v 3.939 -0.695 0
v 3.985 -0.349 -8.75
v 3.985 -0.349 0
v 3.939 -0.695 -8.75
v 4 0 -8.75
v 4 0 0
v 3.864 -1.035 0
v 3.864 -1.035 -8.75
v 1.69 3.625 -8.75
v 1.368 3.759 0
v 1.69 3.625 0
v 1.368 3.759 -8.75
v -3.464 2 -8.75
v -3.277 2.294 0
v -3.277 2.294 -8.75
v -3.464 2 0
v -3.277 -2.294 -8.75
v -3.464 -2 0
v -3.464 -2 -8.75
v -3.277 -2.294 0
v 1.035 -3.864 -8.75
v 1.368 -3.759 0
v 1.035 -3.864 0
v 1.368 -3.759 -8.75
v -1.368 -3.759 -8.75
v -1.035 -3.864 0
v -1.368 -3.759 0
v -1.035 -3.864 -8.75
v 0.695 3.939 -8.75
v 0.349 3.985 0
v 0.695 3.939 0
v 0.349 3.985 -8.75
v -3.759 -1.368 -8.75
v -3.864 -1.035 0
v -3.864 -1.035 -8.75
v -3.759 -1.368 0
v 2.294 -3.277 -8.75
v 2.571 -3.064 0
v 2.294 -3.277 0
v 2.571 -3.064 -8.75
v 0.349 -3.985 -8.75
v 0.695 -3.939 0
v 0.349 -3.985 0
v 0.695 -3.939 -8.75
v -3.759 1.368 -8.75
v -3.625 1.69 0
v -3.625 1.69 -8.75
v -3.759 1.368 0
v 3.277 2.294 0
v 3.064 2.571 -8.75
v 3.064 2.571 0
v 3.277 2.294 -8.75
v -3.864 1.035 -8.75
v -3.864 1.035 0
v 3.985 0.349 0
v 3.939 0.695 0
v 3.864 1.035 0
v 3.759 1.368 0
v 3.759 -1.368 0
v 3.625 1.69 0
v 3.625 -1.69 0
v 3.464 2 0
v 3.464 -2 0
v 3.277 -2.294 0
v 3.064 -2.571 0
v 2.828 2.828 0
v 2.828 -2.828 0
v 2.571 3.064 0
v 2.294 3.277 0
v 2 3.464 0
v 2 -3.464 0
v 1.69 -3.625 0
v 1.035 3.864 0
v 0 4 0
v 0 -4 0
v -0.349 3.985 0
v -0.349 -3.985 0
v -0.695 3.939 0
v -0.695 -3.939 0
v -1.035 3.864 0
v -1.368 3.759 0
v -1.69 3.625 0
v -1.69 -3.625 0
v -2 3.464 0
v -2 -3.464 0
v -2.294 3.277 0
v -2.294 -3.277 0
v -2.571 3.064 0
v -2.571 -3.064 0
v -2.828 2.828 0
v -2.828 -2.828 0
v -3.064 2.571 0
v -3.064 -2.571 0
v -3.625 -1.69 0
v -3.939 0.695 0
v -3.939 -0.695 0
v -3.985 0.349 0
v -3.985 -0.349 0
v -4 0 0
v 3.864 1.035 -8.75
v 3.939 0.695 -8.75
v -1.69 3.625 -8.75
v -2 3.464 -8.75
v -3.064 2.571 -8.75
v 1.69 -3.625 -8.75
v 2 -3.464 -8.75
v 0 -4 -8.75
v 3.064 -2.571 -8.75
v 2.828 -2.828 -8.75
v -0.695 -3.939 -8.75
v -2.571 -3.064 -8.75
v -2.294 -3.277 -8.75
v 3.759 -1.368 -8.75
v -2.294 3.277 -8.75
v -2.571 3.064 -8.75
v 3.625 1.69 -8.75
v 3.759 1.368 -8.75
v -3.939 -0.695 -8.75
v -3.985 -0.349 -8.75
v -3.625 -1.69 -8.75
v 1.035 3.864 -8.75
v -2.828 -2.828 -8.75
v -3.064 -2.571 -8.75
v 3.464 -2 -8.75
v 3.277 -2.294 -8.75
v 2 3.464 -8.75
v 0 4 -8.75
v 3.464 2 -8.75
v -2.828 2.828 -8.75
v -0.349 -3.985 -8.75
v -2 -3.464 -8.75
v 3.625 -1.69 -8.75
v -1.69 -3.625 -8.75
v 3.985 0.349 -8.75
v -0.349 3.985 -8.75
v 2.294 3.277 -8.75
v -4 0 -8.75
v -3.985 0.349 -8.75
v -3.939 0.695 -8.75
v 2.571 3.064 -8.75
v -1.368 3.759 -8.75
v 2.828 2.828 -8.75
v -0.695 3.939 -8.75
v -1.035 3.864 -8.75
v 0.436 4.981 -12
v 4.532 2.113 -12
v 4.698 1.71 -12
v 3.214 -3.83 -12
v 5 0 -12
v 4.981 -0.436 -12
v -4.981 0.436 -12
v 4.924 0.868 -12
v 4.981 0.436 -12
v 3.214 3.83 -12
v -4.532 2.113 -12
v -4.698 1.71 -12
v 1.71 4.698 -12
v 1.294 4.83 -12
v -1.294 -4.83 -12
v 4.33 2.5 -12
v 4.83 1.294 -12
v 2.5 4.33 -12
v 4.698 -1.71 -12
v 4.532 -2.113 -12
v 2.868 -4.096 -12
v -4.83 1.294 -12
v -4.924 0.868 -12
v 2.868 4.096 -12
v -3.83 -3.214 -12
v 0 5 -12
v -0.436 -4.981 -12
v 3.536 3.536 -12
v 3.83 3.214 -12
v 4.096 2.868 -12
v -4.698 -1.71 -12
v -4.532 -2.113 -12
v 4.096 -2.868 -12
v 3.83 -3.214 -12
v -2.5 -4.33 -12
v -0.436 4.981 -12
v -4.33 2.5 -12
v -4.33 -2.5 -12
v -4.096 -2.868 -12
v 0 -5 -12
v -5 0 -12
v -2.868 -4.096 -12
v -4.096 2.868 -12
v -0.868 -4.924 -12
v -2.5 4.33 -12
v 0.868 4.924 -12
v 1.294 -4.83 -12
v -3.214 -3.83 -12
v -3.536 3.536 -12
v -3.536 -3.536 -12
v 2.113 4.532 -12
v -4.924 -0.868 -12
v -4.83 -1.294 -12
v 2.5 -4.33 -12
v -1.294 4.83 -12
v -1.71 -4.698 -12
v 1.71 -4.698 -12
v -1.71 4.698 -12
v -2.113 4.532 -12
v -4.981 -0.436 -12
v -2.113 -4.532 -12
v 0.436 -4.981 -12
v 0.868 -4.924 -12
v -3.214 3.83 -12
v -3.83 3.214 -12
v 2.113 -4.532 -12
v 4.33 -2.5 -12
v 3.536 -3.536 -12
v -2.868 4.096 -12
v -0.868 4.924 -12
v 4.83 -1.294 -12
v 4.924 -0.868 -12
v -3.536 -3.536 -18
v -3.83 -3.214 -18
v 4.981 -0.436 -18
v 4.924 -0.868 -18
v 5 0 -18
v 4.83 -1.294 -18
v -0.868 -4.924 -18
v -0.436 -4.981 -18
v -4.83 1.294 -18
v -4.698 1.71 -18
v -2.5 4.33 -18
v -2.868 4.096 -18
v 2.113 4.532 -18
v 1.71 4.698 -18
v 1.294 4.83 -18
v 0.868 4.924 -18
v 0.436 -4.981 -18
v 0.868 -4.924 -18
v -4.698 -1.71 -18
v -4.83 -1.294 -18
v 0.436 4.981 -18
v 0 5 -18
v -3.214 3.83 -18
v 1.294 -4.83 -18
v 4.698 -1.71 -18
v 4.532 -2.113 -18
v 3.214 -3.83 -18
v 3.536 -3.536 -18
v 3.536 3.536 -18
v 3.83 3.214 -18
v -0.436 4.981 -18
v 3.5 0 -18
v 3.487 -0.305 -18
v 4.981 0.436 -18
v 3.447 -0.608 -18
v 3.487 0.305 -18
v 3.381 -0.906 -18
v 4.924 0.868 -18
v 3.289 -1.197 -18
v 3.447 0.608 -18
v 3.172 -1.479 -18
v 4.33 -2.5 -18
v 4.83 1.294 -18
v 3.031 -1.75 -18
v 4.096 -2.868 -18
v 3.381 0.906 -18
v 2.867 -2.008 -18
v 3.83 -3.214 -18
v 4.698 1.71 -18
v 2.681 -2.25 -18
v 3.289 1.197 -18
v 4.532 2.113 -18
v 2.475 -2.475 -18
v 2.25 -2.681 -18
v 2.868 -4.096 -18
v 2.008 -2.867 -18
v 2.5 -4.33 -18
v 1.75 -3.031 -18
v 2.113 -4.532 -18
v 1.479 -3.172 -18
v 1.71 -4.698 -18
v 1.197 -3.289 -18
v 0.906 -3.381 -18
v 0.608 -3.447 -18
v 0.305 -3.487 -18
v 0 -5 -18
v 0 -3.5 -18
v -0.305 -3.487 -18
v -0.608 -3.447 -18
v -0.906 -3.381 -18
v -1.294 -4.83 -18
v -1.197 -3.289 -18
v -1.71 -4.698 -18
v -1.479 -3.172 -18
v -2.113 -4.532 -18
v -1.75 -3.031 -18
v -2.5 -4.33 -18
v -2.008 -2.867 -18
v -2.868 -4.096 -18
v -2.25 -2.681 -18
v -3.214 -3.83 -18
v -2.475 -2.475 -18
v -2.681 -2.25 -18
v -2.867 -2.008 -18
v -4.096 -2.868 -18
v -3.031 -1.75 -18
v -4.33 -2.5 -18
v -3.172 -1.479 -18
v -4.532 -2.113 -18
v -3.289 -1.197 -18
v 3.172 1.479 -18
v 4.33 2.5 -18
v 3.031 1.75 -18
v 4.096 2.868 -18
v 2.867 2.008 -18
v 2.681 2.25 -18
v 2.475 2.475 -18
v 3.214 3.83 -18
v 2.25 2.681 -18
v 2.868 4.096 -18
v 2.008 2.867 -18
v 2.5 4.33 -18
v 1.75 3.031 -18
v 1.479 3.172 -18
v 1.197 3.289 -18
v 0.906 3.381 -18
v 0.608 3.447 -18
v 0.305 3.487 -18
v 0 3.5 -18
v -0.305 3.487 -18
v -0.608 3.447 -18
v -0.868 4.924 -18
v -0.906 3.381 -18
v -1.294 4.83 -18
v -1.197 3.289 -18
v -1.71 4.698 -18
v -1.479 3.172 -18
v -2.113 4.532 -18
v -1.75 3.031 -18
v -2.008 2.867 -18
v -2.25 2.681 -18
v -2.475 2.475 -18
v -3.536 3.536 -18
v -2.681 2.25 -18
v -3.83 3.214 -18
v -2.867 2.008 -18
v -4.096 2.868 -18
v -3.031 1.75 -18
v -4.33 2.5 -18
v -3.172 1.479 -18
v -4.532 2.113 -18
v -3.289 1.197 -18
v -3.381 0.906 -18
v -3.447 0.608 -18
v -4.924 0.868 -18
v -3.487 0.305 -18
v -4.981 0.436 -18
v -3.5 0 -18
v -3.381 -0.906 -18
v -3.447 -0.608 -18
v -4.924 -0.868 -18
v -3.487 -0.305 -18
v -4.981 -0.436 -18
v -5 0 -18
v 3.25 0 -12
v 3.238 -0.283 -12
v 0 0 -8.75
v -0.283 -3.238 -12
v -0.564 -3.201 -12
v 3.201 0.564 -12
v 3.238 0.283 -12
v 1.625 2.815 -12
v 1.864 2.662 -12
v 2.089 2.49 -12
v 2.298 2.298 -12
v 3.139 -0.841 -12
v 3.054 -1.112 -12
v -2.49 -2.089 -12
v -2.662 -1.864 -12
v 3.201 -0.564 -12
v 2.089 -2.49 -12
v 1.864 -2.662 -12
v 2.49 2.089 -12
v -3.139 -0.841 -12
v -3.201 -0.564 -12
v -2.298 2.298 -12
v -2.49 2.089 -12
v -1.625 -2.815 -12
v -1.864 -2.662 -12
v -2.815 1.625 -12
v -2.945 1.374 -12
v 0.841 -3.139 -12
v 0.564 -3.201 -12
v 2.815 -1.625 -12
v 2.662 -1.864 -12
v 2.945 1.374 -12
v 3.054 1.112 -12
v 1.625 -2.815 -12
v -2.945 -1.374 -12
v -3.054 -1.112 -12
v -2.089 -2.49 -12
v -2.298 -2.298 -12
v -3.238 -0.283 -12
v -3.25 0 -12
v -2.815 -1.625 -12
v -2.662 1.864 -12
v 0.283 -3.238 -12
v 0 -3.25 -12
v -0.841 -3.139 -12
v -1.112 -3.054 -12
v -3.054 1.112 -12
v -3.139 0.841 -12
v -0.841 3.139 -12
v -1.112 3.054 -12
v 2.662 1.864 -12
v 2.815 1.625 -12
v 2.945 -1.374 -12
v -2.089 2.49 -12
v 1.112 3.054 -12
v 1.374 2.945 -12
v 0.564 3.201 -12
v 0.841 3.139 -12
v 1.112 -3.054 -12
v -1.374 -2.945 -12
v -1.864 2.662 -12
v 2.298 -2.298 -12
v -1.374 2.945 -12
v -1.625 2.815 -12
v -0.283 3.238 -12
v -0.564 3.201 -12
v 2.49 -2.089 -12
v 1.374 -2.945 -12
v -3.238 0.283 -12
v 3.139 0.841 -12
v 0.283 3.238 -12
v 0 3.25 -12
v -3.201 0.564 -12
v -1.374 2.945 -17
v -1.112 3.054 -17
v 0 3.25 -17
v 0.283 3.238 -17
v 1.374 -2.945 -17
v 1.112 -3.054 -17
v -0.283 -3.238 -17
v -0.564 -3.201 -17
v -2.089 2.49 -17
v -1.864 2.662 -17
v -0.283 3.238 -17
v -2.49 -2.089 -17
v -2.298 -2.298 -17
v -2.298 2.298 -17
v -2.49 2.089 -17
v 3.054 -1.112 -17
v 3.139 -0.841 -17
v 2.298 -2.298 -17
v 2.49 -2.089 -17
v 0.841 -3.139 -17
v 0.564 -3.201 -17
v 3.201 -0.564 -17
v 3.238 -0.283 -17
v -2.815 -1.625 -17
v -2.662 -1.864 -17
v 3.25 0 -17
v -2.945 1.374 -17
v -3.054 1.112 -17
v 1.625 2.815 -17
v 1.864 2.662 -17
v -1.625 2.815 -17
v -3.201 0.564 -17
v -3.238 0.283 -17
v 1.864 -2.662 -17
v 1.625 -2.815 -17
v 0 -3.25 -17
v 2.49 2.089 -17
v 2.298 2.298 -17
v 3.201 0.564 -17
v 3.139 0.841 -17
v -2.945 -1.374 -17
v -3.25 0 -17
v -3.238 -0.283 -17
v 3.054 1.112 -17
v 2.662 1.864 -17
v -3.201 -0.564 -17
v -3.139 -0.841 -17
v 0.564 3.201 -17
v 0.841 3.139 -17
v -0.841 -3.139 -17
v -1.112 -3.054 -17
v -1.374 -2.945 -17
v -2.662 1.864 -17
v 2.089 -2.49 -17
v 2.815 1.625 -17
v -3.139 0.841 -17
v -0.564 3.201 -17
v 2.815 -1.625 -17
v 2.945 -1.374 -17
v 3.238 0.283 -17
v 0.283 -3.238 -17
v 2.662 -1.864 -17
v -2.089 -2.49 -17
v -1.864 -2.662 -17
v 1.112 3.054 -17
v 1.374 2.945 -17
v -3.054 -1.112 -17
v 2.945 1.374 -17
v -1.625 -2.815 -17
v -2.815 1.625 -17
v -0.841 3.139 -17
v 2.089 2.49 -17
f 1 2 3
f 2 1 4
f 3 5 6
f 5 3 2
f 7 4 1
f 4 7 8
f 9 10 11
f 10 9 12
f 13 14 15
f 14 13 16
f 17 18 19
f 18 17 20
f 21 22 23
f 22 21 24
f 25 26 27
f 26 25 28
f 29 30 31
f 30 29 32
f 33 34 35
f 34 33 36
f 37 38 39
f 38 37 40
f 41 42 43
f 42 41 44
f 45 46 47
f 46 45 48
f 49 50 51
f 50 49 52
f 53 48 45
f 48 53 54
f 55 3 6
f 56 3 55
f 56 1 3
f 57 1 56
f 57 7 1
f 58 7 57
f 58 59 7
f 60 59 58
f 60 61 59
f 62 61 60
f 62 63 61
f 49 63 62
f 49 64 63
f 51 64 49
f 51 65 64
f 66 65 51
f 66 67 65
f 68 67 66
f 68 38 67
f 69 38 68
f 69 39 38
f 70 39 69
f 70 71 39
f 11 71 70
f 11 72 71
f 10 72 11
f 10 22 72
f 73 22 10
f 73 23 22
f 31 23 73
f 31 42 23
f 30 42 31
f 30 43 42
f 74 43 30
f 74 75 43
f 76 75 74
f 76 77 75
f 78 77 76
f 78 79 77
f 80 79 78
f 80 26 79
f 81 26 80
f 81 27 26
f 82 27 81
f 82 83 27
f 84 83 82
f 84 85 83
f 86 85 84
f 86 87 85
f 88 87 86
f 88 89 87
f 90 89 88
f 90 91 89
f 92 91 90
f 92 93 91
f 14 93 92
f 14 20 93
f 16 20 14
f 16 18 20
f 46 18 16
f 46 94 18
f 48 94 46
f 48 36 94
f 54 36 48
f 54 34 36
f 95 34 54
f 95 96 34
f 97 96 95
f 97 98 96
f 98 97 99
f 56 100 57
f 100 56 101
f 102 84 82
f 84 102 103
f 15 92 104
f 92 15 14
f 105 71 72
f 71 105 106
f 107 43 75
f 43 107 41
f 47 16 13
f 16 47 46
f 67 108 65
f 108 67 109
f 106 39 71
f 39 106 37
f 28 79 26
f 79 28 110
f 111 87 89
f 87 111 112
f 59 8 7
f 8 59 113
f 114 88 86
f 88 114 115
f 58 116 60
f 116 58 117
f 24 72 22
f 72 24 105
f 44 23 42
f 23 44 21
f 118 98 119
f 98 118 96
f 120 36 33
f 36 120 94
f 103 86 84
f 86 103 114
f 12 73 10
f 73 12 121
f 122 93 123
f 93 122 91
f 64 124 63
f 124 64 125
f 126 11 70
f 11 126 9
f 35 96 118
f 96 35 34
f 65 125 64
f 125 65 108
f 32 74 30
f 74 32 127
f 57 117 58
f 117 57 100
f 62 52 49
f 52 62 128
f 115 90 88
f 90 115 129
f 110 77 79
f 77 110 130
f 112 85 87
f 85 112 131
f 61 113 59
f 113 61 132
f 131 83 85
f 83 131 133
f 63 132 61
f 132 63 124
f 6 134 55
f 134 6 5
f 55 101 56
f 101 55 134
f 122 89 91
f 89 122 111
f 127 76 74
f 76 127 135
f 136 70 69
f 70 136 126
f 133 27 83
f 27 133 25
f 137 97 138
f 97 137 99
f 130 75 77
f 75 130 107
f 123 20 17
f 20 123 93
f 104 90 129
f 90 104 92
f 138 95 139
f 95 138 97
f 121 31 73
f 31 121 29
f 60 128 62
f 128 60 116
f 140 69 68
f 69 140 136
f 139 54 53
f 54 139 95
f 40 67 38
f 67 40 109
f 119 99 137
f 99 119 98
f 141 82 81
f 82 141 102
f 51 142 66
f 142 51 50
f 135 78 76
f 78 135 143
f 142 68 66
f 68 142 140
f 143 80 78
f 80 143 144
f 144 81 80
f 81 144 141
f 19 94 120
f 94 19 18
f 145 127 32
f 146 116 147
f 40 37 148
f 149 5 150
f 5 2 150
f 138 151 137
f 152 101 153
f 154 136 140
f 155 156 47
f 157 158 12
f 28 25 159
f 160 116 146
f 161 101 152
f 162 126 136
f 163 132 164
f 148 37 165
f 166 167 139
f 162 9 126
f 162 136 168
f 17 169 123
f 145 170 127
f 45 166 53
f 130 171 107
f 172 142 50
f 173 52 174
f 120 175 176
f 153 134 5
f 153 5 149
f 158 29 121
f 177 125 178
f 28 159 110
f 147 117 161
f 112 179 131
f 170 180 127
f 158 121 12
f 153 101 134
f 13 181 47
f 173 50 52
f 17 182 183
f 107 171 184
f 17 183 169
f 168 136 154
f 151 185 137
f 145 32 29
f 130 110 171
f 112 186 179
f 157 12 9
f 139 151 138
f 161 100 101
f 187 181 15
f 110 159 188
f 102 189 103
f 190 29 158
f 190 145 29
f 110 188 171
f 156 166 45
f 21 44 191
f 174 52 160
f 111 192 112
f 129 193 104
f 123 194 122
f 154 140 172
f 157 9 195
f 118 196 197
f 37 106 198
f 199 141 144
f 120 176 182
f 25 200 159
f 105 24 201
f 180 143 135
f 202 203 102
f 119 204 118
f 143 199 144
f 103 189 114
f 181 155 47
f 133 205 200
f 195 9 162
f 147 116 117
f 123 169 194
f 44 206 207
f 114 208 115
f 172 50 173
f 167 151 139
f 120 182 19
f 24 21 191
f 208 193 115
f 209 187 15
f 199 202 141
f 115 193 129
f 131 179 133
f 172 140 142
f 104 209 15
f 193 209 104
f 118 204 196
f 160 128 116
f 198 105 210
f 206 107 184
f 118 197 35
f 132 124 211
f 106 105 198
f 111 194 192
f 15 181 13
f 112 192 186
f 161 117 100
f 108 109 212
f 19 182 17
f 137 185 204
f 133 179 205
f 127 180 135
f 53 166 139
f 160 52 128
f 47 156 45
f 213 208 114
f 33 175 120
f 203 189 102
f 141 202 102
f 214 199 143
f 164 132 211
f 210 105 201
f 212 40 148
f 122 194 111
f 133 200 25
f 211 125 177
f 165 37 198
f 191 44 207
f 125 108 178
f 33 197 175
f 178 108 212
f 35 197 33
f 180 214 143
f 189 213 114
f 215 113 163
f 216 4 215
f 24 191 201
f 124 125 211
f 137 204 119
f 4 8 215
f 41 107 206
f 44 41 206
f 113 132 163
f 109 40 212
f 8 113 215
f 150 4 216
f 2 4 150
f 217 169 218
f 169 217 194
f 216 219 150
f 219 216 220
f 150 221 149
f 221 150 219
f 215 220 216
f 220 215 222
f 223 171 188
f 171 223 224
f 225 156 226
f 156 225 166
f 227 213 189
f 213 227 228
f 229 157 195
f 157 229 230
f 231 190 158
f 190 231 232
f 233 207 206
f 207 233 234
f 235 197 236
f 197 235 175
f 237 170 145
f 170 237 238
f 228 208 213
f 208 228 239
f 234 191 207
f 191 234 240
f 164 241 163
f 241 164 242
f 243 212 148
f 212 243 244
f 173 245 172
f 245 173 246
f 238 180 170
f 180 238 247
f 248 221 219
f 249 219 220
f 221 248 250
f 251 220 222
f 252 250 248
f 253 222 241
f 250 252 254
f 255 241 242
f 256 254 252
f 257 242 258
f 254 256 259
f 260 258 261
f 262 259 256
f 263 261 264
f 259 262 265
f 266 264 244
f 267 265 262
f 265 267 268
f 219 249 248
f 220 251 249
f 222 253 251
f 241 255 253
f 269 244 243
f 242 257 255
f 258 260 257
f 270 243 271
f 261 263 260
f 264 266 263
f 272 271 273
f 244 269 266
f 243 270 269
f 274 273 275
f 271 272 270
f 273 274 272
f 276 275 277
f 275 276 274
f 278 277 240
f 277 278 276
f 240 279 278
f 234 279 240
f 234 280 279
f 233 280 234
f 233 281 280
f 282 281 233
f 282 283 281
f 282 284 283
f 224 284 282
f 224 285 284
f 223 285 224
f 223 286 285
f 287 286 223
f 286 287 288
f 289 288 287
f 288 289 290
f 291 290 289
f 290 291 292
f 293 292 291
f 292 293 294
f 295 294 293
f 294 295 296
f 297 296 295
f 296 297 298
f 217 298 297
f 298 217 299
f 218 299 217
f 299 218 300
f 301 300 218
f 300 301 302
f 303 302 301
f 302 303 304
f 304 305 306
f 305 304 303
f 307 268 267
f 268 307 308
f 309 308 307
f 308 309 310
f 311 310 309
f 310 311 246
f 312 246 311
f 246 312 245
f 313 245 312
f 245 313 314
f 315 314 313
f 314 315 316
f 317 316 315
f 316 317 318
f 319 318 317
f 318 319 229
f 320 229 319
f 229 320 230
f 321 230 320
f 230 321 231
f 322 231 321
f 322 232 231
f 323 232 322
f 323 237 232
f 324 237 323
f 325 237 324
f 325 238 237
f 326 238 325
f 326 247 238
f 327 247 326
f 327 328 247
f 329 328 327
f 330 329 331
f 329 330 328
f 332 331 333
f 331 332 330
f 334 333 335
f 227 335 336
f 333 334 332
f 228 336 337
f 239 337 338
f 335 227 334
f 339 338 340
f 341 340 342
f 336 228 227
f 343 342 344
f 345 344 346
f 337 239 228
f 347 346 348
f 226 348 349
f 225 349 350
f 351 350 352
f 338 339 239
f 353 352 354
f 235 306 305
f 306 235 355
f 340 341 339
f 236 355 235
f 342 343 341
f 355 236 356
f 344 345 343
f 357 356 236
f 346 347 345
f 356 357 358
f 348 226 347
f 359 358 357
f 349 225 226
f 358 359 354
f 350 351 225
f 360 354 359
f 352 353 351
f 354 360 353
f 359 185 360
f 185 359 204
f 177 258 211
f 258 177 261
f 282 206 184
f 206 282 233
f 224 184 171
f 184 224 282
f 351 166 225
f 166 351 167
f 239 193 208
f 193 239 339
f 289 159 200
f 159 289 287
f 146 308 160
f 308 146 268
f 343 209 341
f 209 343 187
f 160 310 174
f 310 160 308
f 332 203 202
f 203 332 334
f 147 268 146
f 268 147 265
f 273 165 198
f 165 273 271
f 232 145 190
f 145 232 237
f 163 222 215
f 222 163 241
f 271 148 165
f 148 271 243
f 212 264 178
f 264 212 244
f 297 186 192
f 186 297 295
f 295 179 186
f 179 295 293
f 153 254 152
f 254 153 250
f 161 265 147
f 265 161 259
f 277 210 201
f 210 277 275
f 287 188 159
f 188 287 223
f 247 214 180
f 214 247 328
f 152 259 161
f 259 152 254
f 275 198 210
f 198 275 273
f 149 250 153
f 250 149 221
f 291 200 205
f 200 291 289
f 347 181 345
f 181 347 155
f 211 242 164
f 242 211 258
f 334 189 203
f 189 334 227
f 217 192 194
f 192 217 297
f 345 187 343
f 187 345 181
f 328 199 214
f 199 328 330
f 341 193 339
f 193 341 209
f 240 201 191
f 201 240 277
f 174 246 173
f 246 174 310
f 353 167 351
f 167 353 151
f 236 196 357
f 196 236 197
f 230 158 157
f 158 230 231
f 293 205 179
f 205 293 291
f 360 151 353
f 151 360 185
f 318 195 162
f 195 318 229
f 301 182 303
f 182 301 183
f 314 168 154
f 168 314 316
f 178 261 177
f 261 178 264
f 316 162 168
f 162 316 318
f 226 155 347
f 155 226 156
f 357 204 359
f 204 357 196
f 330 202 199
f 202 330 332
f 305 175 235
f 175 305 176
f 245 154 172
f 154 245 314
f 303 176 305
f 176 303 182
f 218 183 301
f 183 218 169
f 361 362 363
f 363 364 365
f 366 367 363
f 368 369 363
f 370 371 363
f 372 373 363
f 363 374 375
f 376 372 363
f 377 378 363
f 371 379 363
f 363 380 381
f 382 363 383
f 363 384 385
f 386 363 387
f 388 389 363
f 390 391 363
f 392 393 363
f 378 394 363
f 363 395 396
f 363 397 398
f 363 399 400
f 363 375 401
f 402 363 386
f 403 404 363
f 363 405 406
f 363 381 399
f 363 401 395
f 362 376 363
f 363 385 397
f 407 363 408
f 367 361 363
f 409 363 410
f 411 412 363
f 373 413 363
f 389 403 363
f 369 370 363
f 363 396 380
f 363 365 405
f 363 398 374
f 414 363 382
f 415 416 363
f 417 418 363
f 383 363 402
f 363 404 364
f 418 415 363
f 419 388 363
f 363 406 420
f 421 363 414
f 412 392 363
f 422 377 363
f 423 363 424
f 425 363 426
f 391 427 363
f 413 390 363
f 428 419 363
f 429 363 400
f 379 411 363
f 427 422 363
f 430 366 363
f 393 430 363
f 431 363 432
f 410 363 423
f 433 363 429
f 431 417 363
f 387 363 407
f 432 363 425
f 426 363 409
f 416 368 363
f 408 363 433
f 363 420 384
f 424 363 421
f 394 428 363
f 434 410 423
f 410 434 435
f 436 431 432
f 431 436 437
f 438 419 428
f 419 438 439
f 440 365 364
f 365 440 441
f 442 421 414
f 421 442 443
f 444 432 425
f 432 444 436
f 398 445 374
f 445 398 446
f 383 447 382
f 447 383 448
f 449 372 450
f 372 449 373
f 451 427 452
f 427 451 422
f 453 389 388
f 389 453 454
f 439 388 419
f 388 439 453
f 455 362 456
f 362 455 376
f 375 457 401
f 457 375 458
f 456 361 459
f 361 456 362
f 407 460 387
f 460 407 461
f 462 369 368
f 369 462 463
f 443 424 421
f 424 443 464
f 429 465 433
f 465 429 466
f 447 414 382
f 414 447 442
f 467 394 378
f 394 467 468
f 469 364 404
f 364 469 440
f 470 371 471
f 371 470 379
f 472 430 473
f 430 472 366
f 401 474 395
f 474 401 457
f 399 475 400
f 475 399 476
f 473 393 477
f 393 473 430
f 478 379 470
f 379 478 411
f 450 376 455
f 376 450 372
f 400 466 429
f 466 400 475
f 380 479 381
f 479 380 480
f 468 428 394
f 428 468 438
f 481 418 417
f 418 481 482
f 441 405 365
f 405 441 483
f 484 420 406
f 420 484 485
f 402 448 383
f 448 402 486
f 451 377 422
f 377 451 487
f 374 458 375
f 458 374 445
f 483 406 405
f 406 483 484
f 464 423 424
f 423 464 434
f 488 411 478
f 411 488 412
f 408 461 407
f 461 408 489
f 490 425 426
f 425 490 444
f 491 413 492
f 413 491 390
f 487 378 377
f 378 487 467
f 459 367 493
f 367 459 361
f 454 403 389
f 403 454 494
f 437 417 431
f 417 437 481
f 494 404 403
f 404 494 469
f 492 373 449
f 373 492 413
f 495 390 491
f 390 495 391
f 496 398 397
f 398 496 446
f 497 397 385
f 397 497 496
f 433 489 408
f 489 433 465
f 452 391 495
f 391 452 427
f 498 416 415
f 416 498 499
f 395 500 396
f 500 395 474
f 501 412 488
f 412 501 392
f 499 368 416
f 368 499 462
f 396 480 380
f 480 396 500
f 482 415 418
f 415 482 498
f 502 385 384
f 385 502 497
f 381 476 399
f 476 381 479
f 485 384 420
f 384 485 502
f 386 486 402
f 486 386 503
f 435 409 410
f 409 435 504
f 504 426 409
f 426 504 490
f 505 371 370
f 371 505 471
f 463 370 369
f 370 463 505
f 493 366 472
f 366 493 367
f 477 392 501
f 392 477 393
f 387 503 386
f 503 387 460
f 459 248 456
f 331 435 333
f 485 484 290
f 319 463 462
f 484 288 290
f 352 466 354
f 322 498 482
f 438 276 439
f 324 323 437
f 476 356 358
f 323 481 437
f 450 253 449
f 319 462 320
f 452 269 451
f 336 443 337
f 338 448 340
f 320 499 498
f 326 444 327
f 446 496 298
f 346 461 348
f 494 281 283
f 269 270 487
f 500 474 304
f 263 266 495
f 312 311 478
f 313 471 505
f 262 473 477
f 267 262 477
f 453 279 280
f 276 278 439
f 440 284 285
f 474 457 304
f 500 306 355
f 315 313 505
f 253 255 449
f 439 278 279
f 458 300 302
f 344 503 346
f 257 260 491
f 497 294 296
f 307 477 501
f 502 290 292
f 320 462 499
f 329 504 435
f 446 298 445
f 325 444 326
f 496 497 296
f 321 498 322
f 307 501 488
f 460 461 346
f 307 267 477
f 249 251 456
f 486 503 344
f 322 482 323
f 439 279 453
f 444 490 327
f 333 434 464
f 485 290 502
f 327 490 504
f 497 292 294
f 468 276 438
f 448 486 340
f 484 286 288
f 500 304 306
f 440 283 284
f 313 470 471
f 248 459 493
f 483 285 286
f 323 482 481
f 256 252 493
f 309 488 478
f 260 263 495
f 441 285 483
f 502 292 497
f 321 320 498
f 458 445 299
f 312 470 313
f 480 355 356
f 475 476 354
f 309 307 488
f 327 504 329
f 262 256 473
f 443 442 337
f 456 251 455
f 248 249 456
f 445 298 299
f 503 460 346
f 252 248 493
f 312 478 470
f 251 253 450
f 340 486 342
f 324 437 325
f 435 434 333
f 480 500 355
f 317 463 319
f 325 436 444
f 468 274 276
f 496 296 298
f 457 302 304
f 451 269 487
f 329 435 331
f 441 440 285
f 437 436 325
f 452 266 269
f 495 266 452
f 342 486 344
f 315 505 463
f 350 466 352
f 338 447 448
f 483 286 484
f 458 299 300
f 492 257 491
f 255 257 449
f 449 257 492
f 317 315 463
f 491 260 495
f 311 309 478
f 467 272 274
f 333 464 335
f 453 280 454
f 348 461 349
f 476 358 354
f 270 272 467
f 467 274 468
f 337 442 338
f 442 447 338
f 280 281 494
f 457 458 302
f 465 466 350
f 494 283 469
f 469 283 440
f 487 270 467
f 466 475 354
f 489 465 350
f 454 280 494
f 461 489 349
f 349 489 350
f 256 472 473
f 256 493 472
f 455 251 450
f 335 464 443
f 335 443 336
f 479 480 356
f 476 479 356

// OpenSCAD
Gap = 0.2;
$fn = 72;

RodToBearingCoupling();

module RodToBearingCoupling() {
    CouplingDiameter = 10;
    BearingDiameter = 8;
    BearingHeight = 12;
    MiddleThickness = (CouplingDiameter - BearingDiameter) / 2; // Keep slope at 45 degrees
    RodHeight = 5;
    RodDiameter = 6.5;
    ConeHeight = RodDiameter / 2; // Keep slope at 45 degrees
    RimHeight = 1;
    RimDiameter = 7;

    rotate([180,0,0])
    {
        difference() {
            // Body
            union () {
                cylinder(r=BearingDiameter / 2, h = BearingHeight);
                
                translate([0,0,BearingHeight - ConeHeight])
                    cylinder(r1=BearingDiameter / 2 , r2=CouplingDiameter / 2, h = ConeHeight);

                translate([0,0,BearingHeight])
                    cylinder(r=CouplingDiameter / 2, h = RodHeight + RimHeight);
            }
            // Space for threaded rod
            union () {
                translate([0,0,BearingHeight - ConeHeight])
                    cylinder(r1=0, r2=RodDiameter/2, h = ConeHeight);

                translate([0,0,BearingHeight])
                    cylinder(r=RodDiameter/2, h = RodHeight);

                translate([0,0,BearingHeight+RodHeight])
                    cylinder(r1=RodDiameter/2, r2=RimDiameter/2, h = RimHeight);
            }
        }
    }
}
